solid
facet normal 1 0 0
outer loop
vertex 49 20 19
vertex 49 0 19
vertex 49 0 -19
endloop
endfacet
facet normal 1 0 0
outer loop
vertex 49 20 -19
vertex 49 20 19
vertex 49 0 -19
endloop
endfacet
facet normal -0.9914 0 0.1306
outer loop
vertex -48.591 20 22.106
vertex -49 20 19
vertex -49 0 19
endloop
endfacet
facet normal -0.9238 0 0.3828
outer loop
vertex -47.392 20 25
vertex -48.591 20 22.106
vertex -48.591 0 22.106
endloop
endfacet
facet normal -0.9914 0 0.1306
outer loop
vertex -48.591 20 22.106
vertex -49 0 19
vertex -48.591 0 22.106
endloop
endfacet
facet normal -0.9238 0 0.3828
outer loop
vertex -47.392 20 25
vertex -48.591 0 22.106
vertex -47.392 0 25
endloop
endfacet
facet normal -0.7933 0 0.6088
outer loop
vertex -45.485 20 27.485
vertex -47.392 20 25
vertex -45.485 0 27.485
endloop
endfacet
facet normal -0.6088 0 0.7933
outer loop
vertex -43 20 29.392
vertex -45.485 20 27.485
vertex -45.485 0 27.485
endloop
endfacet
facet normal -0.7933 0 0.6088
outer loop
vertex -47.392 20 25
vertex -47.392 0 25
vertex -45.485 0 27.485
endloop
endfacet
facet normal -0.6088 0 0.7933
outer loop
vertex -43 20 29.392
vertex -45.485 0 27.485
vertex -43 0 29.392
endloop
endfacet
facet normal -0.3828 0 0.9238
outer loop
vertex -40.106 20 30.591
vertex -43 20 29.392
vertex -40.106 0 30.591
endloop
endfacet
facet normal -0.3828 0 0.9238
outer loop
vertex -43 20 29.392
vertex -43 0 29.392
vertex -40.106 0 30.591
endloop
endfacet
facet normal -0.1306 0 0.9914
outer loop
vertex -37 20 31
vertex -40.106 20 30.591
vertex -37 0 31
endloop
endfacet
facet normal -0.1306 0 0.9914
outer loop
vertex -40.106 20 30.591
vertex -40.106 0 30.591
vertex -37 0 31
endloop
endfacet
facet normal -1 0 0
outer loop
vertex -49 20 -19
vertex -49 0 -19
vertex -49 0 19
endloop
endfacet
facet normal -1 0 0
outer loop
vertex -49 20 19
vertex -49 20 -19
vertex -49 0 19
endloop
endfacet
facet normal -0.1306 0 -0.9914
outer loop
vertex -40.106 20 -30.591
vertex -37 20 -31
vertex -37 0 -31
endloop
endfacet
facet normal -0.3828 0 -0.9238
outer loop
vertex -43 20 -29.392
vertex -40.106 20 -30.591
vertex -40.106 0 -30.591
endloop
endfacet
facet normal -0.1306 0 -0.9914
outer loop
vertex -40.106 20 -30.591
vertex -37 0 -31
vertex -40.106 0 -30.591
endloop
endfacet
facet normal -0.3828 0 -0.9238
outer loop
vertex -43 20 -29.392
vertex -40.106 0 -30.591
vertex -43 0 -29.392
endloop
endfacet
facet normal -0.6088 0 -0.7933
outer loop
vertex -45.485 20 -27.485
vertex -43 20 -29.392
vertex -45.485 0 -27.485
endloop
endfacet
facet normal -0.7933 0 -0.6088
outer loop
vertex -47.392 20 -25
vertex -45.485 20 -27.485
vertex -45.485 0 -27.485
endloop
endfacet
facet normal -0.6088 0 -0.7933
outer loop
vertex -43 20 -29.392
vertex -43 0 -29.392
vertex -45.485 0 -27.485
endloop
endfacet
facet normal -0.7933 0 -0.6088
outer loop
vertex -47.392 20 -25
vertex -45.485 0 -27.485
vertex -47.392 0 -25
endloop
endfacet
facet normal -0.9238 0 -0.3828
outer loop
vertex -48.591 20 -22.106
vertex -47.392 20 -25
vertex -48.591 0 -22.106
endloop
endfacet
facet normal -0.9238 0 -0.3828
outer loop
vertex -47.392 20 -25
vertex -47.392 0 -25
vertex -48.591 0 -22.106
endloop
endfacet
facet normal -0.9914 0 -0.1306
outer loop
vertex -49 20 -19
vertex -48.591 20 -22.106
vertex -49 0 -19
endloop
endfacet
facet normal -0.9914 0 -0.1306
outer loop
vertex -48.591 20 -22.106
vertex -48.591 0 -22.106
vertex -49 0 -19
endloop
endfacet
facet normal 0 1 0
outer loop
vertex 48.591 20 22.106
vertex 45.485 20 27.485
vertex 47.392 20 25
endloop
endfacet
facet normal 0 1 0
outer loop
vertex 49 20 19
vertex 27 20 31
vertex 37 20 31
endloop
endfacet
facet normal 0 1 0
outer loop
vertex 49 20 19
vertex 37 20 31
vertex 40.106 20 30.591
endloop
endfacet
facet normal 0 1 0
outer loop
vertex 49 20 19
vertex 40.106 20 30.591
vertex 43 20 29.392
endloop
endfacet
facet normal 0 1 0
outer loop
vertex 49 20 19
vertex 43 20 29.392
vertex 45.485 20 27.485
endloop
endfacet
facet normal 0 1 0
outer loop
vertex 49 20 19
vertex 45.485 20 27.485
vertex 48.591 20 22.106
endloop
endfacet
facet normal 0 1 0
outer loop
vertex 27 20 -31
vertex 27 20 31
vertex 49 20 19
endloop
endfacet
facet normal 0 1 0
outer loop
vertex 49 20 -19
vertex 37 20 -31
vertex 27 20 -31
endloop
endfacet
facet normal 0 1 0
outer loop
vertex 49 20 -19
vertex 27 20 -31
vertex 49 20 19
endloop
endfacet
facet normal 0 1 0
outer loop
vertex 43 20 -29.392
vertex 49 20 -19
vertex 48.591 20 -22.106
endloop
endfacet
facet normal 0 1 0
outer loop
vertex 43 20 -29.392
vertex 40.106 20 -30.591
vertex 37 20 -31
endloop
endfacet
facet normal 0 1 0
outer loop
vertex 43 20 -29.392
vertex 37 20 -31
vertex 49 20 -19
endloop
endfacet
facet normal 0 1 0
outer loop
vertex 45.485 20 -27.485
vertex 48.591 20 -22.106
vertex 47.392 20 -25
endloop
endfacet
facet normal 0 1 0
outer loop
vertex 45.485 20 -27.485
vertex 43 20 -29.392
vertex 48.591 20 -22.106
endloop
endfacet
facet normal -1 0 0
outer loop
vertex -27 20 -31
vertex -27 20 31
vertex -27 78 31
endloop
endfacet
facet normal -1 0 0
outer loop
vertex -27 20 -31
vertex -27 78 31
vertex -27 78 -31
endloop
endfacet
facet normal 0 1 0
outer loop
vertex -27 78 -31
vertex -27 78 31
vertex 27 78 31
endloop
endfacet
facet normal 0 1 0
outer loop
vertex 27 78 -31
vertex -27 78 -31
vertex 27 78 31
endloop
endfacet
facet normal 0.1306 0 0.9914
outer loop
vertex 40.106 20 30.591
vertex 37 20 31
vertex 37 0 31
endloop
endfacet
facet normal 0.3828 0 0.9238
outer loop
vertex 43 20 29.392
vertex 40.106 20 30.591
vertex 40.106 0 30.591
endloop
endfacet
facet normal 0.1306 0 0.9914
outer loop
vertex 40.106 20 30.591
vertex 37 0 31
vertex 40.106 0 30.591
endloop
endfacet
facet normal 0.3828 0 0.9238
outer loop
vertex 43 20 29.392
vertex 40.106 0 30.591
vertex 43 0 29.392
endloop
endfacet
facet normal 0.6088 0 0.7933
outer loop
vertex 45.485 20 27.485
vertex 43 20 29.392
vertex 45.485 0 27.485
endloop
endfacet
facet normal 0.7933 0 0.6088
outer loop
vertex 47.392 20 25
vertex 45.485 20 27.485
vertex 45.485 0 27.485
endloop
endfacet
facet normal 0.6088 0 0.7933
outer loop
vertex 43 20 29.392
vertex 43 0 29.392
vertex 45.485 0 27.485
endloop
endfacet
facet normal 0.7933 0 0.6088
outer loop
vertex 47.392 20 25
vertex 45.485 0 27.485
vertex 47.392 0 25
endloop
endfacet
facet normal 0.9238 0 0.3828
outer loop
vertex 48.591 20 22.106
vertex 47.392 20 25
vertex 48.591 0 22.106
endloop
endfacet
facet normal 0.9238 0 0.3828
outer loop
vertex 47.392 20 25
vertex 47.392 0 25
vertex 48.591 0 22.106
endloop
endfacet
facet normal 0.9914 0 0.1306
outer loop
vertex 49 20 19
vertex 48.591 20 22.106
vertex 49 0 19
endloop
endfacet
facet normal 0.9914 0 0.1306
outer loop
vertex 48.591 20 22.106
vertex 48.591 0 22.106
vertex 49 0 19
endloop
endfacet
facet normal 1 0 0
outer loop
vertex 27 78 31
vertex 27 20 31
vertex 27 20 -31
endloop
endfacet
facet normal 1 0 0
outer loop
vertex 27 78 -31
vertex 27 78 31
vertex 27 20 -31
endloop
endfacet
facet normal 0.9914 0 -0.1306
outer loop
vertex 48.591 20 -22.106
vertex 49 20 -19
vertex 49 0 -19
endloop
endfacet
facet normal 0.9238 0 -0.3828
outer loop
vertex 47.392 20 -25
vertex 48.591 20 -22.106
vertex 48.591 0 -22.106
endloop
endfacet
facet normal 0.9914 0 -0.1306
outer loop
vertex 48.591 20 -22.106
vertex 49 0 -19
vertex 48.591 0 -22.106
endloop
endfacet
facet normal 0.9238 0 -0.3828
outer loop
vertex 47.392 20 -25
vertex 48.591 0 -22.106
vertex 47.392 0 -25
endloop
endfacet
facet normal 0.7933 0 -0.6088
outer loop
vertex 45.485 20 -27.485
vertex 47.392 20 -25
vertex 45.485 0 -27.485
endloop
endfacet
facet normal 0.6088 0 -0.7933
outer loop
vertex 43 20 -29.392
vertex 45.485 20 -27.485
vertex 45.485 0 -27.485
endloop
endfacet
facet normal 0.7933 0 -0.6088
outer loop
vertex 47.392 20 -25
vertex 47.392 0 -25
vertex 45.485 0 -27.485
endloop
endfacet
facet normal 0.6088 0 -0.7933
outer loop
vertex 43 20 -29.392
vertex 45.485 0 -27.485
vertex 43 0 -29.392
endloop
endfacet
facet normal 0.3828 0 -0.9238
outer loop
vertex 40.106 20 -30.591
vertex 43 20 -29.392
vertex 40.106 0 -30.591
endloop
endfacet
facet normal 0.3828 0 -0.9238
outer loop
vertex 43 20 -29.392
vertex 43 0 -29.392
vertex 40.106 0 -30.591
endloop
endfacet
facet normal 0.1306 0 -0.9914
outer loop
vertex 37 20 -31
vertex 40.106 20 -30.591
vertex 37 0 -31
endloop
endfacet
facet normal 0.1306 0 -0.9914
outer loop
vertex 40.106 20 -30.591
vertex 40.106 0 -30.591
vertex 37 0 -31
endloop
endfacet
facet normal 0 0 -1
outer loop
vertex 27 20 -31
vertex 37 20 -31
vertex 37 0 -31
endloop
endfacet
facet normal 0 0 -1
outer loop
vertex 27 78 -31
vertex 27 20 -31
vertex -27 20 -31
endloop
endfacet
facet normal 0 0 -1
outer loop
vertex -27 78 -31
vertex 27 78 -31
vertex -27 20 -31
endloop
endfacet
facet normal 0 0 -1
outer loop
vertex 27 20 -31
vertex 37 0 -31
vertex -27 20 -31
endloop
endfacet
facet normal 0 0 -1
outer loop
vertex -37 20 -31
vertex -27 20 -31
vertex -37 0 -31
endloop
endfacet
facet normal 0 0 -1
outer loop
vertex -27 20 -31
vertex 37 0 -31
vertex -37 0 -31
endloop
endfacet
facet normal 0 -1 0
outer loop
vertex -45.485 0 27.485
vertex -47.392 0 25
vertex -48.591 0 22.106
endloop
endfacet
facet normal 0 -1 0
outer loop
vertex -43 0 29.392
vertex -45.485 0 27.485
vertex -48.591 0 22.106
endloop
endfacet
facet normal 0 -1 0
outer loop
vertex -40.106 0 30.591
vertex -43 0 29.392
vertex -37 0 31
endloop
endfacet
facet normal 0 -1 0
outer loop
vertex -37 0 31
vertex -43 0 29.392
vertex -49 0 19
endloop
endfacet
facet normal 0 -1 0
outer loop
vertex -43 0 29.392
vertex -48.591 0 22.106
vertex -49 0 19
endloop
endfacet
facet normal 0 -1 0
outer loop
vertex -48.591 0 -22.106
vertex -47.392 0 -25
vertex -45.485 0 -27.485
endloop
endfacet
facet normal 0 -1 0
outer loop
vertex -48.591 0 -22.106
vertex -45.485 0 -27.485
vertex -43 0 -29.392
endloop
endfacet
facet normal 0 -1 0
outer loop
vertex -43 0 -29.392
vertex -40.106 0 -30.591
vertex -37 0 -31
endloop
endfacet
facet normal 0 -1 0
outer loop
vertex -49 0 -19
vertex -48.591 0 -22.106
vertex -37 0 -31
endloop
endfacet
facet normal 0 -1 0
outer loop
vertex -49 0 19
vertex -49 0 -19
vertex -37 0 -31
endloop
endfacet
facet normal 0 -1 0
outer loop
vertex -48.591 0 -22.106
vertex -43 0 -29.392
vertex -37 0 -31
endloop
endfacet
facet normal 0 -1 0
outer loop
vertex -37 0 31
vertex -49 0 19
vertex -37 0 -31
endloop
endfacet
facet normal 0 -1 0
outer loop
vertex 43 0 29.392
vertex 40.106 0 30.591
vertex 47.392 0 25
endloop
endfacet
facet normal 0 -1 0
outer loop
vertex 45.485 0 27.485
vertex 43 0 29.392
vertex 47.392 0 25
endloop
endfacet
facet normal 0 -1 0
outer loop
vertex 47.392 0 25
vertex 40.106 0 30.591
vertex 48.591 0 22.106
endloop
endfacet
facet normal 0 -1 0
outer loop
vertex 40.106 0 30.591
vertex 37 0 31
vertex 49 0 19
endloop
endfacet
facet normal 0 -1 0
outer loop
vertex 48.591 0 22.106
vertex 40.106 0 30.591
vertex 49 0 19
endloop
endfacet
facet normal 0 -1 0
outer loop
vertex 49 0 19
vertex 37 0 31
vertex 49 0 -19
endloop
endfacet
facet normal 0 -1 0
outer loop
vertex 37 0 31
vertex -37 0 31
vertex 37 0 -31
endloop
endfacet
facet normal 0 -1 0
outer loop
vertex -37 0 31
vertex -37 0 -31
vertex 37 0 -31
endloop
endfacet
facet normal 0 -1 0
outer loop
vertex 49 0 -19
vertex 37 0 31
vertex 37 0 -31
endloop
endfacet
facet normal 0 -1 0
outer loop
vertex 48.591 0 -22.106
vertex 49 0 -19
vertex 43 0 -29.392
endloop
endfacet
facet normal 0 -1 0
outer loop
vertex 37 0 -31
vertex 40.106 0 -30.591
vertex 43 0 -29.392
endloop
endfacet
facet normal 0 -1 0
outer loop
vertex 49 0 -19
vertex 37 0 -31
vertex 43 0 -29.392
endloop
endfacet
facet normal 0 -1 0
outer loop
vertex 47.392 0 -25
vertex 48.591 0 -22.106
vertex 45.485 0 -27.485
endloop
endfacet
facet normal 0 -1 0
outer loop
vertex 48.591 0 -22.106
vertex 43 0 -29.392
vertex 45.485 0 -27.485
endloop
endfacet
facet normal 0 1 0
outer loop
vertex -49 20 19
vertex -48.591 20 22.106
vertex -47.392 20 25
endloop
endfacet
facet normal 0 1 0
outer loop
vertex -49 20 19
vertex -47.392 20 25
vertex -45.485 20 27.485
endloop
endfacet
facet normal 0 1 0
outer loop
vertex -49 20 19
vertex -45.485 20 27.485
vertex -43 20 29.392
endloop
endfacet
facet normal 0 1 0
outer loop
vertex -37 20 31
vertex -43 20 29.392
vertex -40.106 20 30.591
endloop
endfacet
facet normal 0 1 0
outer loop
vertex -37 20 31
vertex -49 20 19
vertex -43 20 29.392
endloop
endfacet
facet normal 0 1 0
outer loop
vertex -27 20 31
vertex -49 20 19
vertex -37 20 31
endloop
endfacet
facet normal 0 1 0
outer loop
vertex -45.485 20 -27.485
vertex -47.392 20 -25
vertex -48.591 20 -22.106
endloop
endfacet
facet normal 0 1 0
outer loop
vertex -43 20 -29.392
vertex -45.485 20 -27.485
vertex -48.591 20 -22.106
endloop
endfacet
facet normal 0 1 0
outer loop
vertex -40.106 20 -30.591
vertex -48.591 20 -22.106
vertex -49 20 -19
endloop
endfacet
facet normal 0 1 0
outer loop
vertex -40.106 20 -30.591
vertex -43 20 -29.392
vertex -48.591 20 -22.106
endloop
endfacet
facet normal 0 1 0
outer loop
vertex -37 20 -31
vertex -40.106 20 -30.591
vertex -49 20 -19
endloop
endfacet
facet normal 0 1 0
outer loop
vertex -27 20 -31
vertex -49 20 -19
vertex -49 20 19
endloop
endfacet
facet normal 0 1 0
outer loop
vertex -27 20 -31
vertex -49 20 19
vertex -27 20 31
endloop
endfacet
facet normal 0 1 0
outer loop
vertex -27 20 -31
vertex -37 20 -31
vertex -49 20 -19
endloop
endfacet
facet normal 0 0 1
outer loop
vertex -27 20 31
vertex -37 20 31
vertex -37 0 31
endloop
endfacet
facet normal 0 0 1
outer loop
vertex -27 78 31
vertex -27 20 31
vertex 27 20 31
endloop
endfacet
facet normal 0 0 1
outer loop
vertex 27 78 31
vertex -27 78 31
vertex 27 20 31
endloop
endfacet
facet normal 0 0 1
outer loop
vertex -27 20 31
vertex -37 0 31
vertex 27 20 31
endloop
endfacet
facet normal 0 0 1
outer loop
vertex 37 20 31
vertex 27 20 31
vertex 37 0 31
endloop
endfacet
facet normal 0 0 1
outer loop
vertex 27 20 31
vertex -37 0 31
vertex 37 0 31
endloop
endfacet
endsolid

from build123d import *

# Parameters (mm, degrees)
EXTRUDE_1_DEPTH = 20
SKETCH_3_W      = 54
SKETCH_3_H      = 62
EXTRUDE_2_DEPTH = 58


with BuildPart() as part:
    # Эскиз2 → Бобышка-Вытянуть1 (new body)
    with BuildSketch(Plane(origin=(0, 0, 0), x_dir=(1, 0, 0), z_dir=(0, 1, 0))):
        with BuildLine():
            Line((-37, -31), (37, -31))
            ThreePointArc((37, -31), (45.485281374, -27.485281374), (49, -19))
            Line((49, -19), (49, 19))
            ThreePointArc((49, 19), (45.485281374, 27.485281374), (37, 31))
            Line((37, 31), (-37, 31))
            ThreePointArc((-37, 31), (-45.485281374, 27.485281374), (-49, 19))
            Line((-49, 19), (-49, -19))
            ThreePointArc((-49, -19), (-45.485281374, -27.485281374), (-37, -31))
        make_face()
    extrude(amount=EXTRUDE_1_DEPTH)

    # Эскиз3 → Бобышка-Вытянуть2 (add)
    with BuildSketch(Plane(origin=(0, 20, 0), x_dir=(1, 0, 0), z_dir=(0, 1, 0))):
        Rectangle(SKETCH_3_W, SKETCH_3_H)
    extrude(amount=EXTRUDE_2_DEPTH)


solid = part.part
